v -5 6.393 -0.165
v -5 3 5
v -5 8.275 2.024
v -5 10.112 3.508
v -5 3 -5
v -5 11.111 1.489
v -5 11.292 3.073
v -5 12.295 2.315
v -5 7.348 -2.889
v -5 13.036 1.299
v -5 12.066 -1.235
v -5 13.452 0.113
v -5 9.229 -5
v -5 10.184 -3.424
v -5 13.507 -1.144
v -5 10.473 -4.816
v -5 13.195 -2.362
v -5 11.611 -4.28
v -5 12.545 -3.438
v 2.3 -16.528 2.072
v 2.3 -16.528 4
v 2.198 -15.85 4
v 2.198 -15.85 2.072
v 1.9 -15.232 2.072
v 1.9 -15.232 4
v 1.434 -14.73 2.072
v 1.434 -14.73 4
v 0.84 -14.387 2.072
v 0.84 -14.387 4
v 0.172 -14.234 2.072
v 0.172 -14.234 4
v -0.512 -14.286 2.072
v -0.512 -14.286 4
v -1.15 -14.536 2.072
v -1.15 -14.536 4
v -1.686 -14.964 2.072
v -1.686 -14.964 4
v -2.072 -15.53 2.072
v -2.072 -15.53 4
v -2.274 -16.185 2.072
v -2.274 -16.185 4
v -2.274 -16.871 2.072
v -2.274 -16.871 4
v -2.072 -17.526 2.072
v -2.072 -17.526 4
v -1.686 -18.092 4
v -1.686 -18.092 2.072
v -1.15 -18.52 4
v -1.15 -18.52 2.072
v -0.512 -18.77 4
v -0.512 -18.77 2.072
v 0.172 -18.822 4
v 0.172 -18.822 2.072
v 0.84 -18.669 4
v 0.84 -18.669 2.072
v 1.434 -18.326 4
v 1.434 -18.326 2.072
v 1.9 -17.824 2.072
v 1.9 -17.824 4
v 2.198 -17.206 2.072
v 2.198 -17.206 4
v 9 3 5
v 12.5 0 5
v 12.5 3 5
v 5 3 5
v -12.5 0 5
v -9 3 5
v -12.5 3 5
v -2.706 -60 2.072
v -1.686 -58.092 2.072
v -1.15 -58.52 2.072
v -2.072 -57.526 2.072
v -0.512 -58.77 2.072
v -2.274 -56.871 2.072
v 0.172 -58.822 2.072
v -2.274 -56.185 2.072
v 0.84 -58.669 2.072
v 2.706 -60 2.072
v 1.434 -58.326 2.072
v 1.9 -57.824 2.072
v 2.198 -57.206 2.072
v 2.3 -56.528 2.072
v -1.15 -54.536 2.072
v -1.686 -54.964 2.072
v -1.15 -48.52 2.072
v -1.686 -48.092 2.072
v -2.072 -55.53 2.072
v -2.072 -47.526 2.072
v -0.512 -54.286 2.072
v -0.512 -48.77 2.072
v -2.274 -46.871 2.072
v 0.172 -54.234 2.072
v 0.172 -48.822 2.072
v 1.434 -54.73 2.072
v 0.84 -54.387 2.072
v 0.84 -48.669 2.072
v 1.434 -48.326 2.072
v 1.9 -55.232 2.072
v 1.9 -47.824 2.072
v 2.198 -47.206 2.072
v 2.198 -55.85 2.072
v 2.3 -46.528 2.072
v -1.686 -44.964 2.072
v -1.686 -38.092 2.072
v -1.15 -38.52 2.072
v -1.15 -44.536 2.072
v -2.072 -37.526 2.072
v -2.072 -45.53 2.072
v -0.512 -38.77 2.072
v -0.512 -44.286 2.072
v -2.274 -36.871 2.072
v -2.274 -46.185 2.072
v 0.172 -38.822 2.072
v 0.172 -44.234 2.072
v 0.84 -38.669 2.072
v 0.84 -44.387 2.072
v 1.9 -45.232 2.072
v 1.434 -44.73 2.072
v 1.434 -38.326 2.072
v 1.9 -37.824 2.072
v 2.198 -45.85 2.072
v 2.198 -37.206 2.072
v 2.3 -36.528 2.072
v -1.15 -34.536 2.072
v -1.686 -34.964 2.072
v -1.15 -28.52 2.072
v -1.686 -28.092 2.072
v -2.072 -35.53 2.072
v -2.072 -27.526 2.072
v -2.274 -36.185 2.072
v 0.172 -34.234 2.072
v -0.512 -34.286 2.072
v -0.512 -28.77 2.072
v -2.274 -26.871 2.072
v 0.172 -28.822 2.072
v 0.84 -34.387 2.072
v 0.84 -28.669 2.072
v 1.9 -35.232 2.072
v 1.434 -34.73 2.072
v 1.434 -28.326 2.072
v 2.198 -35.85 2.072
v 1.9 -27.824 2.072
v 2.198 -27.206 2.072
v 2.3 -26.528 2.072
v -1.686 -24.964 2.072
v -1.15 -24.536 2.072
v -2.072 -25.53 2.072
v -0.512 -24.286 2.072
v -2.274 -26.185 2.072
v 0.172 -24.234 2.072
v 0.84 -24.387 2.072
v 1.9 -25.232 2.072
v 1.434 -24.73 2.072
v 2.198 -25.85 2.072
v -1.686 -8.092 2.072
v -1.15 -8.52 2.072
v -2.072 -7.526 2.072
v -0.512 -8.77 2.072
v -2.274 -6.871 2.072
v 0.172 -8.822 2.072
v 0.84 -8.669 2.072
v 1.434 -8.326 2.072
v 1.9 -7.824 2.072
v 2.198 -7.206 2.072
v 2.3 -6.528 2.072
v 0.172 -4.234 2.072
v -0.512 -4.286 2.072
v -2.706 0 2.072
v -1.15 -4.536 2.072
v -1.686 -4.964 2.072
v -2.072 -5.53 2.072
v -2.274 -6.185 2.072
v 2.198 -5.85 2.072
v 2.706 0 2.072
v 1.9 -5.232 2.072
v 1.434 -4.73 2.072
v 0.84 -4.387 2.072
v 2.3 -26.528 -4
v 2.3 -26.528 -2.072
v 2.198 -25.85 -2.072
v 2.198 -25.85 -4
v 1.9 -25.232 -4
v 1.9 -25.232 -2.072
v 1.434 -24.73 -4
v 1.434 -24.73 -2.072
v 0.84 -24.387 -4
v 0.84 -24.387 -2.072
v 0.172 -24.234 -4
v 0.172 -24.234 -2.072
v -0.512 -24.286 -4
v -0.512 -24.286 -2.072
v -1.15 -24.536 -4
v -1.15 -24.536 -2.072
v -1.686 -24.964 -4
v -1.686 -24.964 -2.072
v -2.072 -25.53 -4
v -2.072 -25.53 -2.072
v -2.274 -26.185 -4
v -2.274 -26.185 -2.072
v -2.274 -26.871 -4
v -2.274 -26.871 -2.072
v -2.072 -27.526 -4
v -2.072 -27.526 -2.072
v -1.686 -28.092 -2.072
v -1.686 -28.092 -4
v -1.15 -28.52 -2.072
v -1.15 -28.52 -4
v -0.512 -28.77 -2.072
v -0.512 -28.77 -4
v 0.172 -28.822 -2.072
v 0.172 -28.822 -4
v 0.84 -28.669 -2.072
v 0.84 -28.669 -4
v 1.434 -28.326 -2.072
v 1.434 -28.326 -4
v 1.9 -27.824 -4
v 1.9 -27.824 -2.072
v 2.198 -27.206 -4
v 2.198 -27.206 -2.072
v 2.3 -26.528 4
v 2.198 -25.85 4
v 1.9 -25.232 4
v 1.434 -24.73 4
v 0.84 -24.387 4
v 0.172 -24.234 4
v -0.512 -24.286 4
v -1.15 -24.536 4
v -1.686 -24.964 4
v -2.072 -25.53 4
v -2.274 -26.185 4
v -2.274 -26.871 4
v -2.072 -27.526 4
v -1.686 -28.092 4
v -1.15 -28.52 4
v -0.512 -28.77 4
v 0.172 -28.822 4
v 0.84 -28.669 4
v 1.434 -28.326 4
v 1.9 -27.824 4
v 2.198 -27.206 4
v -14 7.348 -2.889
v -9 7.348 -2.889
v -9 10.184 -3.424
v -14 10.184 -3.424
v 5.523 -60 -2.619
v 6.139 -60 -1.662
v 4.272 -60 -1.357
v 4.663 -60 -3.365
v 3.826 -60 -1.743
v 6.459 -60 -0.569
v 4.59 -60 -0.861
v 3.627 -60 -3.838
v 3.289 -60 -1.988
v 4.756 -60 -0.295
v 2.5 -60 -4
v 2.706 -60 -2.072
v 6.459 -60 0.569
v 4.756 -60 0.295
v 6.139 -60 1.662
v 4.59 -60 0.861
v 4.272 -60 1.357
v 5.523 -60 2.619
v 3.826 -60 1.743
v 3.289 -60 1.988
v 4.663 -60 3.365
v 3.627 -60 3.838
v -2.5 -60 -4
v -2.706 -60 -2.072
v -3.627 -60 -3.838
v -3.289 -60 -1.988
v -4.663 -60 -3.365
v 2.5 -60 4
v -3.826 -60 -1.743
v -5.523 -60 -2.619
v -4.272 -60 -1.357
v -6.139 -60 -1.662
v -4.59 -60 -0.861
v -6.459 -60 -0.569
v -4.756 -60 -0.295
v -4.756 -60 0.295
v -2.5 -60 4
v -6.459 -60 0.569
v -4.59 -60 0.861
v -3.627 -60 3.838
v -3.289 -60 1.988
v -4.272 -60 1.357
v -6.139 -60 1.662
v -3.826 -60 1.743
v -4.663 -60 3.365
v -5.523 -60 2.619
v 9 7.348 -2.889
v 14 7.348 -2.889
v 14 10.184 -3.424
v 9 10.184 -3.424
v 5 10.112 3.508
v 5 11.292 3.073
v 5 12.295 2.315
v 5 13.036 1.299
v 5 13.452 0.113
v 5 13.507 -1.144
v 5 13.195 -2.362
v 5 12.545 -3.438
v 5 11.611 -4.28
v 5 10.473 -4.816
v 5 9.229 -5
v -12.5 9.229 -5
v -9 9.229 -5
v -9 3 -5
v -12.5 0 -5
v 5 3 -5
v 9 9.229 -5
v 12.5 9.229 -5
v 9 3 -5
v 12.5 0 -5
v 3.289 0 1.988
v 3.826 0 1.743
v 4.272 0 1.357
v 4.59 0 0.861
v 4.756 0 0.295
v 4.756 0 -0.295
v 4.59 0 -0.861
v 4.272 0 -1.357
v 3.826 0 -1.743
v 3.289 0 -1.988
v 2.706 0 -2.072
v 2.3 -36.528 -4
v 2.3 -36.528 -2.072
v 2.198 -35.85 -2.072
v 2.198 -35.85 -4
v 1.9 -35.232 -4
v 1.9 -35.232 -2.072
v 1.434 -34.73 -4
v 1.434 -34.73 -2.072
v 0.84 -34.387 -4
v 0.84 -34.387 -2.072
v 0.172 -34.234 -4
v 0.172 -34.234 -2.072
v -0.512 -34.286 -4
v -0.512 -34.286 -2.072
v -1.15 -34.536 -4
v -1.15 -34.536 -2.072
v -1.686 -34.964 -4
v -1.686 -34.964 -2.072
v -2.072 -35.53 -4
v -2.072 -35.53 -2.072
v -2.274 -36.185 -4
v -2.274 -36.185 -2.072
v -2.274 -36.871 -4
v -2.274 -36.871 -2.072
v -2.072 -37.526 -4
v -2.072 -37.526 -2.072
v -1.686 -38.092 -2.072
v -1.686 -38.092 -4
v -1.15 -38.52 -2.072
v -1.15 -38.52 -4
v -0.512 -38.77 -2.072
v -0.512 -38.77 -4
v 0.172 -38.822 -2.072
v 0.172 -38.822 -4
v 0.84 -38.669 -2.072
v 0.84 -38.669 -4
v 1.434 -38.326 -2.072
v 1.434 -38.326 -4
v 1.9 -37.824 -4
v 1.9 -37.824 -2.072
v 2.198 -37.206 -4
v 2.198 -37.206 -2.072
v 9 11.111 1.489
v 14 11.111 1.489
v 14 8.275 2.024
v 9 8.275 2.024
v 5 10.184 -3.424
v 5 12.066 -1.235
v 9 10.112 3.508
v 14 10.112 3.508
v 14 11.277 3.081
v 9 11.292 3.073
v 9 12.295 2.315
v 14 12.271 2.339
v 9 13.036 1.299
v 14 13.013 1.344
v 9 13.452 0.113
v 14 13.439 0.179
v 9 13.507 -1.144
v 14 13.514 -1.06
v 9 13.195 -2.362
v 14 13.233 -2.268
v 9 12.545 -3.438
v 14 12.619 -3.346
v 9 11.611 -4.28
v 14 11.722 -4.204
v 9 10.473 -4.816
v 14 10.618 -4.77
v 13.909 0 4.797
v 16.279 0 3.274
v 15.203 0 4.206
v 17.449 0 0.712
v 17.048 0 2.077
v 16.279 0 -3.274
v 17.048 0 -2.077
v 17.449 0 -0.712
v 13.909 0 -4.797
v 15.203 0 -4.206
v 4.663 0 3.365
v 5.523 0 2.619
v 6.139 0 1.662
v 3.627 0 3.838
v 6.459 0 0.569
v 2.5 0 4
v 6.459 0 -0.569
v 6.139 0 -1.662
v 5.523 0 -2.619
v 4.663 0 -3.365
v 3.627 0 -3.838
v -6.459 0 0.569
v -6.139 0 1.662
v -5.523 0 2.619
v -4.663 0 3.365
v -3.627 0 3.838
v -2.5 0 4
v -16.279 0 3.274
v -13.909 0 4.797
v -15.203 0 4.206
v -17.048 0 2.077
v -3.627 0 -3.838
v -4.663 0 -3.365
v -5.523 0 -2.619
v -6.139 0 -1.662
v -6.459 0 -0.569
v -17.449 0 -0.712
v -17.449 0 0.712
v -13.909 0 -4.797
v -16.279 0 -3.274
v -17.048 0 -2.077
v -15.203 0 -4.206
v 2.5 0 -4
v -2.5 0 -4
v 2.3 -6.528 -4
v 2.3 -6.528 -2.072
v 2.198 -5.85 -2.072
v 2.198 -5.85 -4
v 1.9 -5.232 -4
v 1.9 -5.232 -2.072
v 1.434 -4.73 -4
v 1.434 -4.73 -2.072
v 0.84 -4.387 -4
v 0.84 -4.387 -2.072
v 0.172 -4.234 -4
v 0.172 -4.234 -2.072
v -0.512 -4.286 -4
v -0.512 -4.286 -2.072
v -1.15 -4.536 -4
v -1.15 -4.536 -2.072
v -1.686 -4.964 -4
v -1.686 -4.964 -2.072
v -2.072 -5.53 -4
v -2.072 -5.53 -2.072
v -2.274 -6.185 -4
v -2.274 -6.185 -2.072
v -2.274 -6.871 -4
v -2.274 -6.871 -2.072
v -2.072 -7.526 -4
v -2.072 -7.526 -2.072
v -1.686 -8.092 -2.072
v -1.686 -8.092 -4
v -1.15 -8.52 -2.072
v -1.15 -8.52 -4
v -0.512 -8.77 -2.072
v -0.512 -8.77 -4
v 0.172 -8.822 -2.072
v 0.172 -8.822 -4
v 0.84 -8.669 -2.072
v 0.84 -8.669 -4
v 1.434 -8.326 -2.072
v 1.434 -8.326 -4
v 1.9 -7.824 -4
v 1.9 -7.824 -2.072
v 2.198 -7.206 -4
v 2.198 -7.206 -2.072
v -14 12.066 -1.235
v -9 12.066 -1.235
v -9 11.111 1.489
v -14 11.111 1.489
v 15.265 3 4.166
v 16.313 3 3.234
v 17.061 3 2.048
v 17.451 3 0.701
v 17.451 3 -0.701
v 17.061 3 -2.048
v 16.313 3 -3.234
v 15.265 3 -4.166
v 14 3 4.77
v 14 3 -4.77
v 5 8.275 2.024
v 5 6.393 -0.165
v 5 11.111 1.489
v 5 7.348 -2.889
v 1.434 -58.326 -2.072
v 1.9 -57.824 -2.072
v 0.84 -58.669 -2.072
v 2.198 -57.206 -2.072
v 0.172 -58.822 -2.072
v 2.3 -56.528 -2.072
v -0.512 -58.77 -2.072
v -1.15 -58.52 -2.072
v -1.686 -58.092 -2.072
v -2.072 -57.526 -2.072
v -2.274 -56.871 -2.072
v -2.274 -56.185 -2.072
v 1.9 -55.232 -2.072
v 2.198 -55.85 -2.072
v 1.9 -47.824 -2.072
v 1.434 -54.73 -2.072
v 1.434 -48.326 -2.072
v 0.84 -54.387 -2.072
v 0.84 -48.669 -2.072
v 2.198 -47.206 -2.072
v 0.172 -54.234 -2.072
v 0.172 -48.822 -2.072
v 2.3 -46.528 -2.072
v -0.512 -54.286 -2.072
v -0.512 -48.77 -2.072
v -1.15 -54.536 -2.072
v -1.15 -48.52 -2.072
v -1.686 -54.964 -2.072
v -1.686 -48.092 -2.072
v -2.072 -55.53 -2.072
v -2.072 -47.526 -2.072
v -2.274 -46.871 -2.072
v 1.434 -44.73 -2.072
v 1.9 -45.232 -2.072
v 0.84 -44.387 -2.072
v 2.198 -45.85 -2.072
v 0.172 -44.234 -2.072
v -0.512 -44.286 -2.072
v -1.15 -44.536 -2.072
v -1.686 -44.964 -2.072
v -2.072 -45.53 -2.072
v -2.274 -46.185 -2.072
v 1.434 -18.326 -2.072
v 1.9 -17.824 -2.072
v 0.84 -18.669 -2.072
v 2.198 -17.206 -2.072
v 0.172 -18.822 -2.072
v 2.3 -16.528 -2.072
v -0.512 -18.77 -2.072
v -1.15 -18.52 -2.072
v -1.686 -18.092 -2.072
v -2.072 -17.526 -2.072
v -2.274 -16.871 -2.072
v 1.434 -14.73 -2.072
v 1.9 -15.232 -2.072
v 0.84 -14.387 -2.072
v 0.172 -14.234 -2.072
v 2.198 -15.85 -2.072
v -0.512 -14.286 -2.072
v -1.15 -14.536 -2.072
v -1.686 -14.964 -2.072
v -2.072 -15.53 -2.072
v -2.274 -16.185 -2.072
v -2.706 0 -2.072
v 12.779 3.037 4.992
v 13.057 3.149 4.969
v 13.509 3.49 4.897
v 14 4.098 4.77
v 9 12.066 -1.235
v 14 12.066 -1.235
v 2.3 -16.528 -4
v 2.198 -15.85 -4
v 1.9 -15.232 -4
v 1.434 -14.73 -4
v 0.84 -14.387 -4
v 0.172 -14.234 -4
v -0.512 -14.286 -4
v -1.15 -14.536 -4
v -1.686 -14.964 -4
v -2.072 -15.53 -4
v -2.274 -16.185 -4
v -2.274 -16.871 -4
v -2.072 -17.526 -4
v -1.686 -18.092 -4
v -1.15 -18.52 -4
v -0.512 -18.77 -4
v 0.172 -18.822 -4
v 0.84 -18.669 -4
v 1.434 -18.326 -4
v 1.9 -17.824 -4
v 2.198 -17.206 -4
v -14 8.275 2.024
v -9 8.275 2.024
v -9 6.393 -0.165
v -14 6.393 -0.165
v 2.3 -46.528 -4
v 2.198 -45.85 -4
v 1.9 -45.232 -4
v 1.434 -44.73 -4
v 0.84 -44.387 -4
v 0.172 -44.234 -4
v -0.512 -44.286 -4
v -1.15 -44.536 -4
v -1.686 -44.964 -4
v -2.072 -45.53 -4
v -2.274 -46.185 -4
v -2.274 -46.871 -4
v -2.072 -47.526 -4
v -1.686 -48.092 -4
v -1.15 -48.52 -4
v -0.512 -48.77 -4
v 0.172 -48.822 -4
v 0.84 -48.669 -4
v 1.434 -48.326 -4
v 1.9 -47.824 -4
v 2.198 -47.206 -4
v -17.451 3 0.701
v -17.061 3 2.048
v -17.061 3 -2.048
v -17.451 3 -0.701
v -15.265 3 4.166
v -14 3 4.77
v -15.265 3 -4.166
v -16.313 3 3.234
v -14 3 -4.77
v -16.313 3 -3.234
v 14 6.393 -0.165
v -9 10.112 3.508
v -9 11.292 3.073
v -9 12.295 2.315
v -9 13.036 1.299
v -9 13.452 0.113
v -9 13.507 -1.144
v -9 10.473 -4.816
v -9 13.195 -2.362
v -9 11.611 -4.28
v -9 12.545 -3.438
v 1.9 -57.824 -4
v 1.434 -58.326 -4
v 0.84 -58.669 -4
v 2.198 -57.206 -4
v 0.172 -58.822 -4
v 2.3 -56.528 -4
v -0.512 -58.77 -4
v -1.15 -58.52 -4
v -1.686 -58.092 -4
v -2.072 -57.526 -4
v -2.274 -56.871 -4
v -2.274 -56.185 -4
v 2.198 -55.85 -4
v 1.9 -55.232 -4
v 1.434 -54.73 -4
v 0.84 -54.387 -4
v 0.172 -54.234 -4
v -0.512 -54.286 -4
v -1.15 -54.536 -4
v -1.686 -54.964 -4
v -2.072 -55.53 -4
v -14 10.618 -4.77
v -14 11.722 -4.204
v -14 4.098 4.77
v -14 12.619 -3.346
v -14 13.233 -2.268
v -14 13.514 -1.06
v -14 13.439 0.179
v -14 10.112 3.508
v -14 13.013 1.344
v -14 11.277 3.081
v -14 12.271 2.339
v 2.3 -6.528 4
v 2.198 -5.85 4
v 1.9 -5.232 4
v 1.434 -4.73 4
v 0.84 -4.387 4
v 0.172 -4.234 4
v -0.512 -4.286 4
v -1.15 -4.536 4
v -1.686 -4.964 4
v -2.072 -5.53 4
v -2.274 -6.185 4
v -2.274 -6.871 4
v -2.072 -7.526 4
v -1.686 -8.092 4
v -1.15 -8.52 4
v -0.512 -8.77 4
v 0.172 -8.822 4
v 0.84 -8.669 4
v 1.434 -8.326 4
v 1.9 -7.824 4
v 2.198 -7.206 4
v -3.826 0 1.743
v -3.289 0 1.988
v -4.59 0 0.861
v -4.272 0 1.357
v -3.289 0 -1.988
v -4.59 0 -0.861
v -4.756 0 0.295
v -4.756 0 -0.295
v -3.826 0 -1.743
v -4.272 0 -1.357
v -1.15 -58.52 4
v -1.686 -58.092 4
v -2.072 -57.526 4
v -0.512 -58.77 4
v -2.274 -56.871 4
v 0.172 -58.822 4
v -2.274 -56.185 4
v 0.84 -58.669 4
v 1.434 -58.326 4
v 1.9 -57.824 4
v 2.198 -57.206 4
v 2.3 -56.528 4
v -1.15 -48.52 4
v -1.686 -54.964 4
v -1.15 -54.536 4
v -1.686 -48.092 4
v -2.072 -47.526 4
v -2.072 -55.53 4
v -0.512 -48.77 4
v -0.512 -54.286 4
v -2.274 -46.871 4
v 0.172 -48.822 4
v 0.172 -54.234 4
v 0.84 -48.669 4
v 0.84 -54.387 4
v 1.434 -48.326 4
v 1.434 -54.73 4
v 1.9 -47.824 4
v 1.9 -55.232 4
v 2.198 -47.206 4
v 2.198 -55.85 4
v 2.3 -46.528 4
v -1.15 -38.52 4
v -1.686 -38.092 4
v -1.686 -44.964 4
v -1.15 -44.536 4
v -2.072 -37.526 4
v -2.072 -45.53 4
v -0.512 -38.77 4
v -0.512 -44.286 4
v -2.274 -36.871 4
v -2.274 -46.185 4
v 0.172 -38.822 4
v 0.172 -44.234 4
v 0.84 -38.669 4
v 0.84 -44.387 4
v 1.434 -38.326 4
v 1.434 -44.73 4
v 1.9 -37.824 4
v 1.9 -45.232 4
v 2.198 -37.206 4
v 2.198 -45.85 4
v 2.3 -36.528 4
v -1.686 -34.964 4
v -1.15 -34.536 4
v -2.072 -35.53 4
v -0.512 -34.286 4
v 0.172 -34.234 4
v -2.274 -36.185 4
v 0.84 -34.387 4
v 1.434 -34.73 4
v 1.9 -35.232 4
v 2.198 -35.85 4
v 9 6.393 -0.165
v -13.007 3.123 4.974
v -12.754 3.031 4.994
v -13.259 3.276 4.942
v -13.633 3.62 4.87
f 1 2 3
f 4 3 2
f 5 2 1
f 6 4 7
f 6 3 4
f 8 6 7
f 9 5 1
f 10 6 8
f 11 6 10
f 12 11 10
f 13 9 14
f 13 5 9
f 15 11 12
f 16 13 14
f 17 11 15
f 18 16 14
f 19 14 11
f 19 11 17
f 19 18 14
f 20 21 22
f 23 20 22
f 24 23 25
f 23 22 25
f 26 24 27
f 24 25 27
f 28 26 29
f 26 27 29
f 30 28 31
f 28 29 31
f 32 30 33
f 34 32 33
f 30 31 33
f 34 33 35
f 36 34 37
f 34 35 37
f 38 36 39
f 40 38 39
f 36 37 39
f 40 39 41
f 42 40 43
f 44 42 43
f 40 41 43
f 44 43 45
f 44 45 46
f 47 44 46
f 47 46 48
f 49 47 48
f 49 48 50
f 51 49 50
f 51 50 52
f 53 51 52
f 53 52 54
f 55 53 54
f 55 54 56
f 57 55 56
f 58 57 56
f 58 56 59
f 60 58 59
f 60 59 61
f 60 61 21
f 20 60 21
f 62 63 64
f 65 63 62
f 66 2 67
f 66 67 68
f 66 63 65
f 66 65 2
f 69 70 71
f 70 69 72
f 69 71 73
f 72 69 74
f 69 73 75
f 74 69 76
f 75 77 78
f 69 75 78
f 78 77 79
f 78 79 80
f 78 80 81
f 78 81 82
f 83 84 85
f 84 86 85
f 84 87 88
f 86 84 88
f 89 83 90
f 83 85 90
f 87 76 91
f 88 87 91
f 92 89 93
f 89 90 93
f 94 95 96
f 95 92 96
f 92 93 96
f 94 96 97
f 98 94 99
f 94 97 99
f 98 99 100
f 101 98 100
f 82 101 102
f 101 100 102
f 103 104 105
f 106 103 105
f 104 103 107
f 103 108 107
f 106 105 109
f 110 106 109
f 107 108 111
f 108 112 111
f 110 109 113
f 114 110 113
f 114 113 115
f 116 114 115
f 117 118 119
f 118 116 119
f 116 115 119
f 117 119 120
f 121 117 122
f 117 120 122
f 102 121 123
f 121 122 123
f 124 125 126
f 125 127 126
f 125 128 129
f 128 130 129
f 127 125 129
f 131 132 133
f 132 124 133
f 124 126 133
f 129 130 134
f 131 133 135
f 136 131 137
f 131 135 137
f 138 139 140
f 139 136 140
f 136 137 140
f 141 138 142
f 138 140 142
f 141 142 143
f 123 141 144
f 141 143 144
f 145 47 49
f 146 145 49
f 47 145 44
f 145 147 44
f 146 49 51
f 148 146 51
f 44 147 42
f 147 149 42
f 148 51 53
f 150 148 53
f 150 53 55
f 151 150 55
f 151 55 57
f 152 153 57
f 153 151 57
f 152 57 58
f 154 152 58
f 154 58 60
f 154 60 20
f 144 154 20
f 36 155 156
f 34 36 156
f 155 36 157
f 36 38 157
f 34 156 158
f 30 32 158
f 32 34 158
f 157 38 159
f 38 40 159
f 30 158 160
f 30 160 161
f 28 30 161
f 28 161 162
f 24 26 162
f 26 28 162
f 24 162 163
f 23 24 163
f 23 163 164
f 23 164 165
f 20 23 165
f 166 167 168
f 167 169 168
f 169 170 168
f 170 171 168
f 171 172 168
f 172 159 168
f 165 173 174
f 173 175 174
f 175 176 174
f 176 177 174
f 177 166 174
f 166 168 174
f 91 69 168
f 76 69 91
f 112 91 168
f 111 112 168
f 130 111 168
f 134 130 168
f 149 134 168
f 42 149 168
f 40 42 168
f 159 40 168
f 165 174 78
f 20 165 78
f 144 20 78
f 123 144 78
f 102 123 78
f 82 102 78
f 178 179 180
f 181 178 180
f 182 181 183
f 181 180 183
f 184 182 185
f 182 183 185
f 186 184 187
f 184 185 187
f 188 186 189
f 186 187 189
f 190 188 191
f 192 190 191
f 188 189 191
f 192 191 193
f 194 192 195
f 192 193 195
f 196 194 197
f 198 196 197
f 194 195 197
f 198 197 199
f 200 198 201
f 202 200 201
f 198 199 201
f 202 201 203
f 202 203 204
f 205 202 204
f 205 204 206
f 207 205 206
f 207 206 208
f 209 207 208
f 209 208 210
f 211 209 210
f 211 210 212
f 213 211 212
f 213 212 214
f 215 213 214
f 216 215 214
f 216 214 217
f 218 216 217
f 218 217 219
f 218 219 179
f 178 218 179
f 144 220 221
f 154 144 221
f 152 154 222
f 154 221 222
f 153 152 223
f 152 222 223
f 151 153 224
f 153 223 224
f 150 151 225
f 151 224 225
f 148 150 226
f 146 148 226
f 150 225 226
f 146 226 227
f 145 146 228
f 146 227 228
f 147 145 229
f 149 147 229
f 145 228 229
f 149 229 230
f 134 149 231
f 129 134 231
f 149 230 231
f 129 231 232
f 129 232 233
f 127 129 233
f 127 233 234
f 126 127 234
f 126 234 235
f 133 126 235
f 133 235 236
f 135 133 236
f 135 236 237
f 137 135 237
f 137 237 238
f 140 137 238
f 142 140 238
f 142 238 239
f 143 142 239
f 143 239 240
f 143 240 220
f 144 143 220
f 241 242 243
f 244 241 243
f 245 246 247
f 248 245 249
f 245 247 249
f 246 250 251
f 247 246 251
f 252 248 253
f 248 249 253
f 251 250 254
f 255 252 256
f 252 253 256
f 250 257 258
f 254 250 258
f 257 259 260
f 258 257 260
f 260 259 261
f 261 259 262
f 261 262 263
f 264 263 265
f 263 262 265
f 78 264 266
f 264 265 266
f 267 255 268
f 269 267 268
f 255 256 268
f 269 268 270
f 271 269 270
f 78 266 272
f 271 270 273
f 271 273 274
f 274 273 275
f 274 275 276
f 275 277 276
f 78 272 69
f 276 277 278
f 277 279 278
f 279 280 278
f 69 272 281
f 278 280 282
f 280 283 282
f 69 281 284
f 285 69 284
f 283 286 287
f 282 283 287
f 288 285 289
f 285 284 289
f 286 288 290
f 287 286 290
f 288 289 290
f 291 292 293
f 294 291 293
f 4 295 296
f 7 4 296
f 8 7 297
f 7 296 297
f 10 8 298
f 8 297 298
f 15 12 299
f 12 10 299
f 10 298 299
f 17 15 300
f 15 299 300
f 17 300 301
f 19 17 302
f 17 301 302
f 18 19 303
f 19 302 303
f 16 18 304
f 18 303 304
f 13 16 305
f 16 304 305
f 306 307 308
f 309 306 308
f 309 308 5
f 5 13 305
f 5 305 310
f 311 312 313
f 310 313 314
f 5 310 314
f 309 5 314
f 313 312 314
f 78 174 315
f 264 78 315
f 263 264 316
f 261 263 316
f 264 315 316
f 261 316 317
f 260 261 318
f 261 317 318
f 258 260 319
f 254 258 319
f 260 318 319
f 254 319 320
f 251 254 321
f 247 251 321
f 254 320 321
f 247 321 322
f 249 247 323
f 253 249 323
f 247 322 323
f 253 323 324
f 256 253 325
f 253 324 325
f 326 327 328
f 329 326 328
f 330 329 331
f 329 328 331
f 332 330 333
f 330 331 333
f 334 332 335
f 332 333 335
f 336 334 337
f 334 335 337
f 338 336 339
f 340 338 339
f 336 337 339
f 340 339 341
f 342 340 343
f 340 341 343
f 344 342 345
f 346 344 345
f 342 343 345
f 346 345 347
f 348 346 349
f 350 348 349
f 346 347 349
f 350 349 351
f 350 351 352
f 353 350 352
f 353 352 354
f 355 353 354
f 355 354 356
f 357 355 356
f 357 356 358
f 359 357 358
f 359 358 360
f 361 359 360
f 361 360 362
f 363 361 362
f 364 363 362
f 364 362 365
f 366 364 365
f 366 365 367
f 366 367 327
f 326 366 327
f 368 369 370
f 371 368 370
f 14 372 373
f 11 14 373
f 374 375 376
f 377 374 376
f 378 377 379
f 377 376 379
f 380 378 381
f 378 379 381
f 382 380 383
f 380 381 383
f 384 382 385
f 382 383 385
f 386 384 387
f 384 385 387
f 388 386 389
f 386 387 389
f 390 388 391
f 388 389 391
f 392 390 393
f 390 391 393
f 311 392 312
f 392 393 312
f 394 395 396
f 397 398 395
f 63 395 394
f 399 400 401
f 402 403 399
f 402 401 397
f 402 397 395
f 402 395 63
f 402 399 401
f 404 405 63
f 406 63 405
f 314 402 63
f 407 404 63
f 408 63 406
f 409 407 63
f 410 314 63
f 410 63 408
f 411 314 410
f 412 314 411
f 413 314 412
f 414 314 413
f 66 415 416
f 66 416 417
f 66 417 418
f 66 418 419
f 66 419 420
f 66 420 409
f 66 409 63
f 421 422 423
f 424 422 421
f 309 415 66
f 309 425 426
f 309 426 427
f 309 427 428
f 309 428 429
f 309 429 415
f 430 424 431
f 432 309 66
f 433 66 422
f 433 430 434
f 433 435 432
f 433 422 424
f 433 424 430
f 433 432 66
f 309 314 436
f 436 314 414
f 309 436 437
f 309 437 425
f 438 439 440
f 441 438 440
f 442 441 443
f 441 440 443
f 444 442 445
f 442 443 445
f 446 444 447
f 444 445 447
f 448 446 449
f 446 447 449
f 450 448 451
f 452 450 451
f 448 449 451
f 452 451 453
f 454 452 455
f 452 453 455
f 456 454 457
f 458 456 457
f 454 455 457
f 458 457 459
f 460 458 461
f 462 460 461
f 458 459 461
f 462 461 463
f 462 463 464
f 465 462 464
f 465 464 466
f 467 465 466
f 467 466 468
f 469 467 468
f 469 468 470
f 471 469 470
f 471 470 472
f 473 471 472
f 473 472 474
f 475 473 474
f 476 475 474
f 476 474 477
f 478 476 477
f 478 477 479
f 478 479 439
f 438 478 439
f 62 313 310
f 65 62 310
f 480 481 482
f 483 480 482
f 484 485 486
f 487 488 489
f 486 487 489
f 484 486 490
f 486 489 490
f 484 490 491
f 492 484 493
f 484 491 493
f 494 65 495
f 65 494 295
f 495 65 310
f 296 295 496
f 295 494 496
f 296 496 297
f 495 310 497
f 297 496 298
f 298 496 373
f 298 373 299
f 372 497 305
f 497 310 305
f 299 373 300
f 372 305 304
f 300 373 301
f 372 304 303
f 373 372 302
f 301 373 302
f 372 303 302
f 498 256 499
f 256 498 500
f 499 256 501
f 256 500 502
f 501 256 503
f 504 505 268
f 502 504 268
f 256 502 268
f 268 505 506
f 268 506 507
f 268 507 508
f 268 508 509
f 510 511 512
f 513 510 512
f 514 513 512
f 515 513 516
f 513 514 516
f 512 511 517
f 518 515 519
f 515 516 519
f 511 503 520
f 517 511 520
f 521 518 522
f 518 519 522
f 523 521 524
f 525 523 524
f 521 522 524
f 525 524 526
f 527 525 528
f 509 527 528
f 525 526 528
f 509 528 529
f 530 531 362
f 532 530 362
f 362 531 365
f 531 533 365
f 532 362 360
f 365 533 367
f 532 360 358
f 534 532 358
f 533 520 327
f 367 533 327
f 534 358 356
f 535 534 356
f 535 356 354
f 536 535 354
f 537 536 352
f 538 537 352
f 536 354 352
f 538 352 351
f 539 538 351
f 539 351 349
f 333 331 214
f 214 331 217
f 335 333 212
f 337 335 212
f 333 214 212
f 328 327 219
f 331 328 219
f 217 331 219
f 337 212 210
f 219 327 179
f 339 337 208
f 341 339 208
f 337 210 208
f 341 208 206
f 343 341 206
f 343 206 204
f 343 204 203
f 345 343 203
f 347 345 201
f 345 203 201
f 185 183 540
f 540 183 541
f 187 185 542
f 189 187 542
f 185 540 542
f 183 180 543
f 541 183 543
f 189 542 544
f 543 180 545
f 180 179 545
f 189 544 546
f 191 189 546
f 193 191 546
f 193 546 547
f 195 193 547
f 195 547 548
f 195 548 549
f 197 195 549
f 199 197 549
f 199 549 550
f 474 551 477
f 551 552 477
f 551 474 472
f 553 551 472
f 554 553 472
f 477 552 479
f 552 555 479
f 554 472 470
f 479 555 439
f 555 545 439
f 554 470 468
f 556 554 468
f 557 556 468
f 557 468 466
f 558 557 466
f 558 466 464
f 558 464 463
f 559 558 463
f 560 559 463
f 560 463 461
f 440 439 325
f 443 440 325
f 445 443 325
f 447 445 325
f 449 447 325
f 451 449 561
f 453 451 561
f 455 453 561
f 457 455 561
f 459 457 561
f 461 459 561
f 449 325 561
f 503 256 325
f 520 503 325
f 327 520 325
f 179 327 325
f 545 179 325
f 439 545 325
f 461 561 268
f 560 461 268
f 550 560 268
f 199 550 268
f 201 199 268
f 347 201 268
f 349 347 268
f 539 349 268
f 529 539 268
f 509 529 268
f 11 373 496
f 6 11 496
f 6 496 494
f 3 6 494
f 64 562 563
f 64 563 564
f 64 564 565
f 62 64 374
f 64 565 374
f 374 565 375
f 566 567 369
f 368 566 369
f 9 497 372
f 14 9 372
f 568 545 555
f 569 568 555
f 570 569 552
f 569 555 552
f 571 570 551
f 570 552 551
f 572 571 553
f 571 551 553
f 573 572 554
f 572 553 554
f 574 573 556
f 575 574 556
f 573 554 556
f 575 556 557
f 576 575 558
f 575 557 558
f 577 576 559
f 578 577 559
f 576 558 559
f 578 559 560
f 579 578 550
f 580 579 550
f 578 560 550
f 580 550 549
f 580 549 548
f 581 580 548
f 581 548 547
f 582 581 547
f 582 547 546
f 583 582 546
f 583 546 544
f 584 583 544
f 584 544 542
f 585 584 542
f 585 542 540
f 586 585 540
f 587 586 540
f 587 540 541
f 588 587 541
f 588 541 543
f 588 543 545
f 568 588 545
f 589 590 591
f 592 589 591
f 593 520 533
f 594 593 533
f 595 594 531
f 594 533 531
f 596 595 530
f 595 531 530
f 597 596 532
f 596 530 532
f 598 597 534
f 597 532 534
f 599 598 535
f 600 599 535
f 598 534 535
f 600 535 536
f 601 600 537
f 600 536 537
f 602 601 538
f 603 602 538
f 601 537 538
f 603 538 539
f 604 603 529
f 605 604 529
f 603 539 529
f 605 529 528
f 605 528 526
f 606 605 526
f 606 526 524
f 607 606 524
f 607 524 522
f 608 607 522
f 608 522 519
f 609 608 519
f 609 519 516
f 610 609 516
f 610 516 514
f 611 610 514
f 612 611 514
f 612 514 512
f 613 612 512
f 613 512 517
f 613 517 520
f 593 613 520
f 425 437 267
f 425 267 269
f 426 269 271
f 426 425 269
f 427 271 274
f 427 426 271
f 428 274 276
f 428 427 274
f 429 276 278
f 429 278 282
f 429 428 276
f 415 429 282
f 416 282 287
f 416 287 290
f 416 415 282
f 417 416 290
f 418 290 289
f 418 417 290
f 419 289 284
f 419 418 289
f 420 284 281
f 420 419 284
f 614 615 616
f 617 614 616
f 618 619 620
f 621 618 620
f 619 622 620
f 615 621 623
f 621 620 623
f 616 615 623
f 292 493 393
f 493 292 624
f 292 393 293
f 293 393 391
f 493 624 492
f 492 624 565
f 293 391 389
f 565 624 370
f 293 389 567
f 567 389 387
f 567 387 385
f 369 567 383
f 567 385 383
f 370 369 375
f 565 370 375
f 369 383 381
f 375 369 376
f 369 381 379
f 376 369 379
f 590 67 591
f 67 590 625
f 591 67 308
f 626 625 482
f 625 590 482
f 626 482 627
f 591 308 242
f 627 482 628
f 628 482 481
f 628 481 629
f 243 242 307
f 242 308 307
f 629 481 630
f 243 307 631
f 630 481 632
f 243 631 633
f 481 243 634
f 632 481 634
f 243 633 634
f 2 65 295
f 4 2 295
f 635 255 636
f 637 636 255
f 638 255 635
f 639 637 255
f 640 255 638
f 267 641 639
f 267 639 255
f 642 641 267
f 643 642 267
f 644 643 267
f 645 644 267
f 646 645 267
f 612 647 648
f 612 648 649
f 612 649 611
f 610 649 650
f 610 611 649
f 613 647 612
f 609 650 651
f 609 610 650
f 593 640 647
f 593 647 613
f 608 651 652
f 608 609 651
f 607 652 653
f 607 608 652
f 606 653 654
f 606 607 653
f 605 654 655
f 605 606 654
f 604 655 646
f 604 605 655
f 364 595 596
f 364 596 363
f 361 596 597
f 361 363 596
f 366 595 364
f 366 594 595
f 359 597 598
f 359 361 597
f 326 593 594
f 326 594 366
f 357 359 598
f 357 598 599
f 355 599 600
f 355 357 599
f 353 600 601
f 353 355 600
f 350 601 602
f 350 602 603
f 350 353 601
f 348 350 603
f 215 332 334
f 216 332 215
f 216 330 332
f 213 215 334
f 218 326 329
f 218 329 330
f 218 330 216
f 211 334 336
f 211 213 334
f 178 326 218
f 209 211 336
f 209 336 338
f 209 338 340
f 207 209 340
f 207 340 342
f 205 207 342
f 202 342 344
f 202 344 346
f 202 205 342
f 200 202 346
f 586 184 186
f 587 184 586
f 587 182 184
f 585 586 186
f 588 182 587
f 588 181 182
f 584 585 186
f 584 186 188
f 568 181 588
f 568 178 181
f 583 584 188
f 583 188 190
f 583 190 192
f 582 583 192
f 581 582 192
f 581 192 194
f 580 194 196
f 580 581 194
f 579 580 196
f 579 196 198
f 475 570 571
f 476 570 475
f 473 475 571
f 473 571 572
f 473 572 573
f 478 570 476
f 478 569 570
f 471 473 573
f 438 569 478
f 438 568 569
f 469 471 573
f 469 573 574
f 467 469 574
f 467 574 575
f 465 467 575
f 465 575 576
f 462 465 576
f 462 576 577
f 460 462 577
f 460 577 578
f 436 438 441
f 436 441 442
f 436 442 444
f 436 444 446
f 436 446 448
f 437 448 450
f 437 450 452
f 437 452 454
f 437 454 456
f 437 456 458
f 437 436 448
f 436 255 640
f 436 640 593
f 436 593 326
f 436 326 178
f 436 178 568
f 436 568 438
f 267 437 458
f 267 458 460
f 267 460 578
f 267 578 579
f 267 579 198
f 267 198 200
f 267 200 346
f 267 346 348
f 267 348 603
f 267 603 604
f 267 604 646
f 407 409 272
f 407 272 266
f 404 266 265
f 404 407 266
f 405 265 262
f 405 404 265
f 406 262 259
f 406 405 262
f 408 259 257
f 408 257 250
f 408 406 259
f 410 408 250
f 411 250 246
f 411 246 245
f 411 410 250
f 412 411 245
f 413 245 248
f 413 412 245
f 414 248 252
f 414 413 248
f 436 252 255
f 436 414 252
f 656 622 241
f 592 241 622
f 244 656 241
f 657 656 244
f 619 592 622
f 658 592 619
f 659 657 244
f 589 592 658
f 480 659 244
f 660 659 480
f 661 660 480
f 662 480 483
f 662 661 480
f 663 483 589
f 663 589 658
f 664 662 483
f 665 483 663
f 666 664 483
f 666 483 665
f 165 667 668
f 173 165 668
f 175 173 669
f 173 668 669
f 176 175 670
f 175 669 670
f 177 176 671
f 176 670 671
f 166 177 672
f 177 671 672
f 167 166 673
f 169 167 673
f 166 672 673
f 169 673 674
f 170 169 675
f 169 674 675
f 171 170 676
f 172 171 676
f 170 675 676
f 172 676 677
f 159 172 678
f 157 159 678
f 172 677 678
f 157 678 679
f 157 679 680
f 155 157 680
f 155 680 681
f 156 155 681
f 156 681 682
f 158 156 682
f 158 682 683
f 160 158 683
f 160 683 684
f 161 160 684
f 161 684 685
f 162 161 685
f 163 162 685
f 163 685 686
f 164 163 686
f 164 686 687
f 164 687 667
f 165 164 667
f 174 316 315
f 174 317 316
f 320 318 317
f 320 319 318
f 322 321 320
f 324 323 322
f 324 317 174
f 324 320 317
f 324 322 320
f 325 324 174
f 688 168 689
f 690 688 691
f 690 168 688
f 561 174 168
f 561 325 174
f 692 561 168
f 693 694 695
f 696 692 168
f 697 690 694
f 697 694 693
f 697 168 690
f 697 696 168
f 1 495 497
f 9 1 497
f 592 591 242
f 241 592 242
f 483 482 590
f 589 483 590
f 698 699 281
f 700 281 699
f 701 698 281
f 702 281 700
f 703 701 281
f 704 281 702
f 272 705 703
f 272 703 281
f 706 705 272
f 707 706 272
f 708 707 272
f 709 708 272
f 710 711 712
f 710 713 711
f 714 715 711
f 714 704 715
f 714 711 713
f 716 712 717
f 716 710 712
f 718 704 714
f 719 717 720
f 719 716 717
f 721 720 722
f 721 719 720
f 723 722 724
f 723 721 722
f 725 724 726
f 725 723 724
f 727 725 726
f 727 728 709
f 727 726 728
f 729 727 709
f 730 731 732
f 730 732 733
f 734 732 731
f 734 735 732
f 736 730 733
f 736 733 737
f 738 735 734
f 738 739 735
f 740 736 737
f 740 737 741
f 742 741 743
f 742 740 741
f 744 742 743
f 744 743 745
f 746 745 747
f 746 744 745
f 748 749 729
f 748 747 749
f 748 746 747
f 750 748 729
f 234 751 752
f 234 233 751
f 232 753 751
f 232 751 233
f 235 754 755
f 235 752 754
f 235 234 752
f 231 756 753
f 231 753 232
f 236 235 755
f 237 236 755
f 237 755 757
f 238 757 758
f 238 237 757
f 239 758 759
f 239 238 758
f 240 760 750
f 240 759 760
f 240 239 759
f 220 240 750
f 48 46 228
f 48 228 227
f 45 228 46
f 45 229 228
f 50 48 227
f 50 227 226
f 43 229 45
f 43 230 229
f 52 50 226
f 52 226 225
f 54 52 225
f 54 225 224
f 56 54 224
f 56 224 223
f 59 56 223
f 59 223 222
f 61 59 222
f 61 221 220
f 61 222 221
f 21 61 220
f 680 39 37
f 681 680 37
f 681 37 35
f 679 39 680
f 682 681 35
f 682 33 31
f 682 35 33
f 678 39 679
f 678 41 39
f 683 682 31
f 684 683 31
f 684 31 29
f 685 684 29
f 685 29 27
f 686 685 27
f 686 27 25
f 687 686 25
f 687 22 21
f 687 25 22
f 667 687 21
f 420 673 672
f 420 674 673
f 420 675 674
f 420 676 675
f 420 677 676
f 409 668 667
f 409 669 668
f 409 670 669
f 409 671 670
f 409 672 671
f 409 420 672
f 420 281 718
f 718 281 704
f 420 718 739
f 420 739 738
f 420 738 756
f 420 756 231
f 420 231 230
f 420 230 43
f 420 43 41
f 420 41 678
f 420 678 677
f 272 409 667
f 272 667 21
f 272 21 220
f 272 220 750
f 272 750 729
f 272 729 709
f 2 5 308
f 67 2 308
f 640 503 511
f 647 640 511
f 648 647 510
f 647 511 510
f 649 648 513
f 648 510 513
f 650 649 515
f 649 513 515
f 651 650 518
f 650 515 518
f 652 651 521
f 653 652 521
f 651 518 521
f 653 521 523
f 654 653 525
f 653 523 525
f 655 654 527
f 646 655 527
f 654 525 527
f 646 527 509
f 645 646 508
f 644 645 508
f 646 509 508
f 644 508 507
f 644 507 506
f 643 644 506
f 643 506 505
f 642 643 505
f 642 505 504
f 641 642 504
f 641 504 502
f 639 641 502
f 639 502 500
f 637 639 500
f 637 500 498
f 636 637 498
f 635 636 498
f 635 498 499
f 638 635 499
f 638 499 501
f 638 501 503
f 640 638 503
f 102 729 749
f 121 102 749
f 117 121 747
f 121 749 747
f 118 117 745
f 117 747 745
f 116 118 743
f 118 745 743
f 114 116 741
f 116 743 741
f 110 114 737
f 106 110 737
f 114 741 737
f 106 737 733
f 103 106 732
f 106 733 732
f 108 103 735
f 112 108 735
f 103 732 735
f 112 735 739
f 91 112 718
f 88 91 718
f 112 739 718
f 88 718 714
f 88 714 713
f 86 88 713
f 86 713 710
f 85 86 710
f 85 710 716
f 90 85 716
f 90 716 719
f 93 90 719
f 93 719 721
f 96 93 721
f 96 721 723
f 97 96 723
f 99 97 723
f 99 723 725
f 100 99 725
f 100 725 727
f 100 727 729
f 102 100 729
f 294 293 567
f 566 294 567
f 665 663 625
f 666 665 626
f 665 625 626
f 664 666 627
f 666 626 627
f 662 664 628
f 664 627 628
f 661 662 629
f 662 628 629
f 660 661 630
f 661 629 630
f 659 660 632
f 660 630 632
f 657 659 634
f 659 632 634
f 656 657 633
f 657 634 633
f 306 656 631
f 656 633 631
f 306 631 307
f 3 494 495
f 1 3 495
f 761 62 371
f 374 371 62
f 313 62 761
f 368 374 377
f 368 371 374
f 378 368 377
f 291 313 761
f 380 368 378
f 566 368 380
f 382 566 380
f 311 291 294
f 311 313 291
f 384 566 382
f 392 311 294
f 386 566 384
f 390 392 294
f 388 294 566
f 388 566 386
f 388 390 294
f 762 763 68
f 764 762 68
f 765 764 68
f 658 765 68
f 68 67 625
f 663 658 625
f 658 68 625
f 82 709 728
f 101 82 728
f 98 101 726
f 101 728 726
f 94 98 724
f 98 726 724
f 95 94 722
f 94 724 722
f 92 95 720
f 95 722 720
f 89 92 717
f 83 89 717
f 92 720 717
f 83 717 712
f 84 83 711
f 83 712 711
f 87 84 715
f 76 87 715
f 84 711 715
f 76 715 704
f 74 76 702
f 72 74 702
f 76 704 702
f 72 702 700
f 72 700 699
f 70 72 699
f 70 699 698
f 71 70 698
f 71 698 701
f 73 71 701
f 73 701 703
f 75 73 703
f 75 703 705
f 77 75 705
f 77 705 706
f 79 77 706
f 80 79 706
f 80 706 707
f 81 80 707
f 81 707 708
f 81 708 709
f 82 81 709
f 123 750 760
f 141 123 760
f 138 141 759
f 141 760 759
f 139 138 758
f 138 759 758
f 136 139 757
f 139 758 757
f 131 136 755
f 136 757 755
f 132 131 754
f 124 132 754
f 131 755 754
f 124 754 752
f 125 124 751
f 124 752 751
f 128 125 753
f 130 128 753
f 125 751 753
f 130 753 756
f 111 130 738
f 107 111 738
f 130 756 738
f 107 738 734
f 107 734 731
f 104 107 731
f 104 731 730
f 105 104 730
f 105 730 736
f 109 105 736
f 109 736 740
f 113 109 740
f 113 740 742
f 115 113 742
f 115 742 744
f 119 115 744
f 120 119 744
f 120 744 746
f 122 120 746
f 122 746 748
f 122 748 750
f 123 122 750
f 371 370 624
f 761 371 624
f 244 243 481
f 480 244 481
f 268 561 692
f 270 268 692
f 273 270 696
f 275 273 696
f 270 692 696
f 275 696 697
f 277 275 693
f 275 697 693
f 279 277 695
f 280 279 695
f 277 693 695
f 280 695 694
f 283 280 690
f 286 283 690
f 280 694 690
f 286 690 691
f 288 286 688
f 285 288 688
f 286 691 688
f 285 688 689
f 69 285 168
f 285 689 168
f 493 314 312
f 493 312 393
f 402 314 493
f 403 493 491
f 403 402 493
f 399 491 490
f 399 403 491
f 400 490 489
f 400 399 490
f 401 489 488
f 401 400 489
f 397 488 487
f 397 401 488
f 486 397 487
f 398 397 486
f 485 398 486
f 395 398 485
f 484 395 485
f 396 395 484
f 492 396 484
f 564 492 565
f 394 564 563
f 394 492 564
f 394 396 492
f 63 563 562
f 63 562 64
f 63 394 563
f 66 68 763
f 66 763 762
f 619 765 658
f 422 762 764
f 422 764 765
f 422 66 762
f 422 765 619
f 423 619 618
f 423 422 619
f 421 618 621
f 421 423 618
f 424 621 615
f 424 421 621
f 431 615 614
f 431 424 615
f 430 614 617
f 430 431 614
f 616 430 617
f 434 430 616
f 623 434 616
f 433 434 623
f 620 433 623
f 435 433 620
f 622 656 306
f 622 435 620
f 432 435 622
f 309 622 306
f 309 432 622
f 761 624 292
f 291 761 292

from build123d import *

# Parameters (mm, degrees)
EXTRUDE_1_DEPTH     = 3
EXTRUDE_2_DEPTH     = 14
EXTRUDE_3_DEPTH     = 60
SKETCH_4_R          = 2.3
CUT_EXTRUDE_1_DEPTH = 60
SKETCH_6_W          = 4
SKETCH_6_H          = 10.529479437
CUT_EXTRUDE_2_DEPTH = 60
CUT_EXTRUDE_4_DEPTH = 60


with BuildPart() as part:
    # 草图1 → 凸台-拉伸1 (new body)
    with BuildSketch(Plane(origin=(0, 0, 0), x_dir=(1, 0, 0), z_dir=(0, 1, 0))):
        with BuildLine():
            Line((-12.5, 5), (12.5, 5))
            ThreePointArc((12.5, 5), (17.5, 0), (12.5, -5))
            Line((12.5, -5), (-12.5, -5))
            ThreePointArc((-12.5, -5), (-17.5, 0), (-12.5, 5))
        make_face()
    extrude(amount=EXTRUDE_1_DEPTH)

    # 草图2 → 凸台-拉伸2 (add, symmetric)
    with BuildSketch(Plane(origin=(0, 0, 0), x_dir=(0, 0, -1), z_dir=(1, 0, 0))):
        with BuildLine():
            Line((-5, 3), (-3.508412685, 10.112107418))
            ThreePointArc((-3.508412685, 10.112107418), (1.143689593, 13.506528918), (5, 9.229494551))
            Line((5, 9.229494551), (5, 3))
            Line((5, 3), (-5, 3))
        make_face()
        Polygon((2.88904253, 7.347609244), (3.424289305, 10.184305249), (1.235261889, 12.066190555), (-1.489012301, 11.111379858), (-2.024259076, 8.274683853), (0.164768339, 6.392798546), align=None, mode=Mode.SUBTRACT)
    extrude(amount=EXTRUDE_2_DEPTH, both=True)

    # 草图3 → 凸台-拉伸3 (add)
    with BuildSketch(Plane.XZ):
        with BuildLine():
            Line((-2.5, 4), (2.5, 4))
            ThreePointArc((2.5, 4), (6.5, 0), (2.5, -4))
            Line((2.5, -4), (-2.5, -4))
            ThreePointArc((-2.5, -4), (-6.5, 0), (-2.5, 4))
        make_face()
        with BuildLine():
            Line((-2.705614888, 2.07197125), (2.705614888, 2.07197125))
            ThreePointArc((2.705614888, 2.07197125), (4.777586138, 0), (2.705614888, -2.07197125))
            Line((2.705614888, -2.07197125), (-2.705614888, -2.07197125))
            ThreePointArc((-2.705614888, -2.07197125), (-4.777586138, 0), (-2.705614888, 2.07197125))
        make_face(mode=Mode.SUBTRACT)
    extrude(amount=EXTRUDE_3_DEPTH)

    # 草图4 → 切除-拉伸1 (cut)
    with BuildSketch(Plane.XY.offset(4)):
        with Locations((0, -6.528023855)):
            Circle(SKETCH_4_R)
        with Locations((0, -16.528023855)):
            Circle(SKETCH_4_R)
        with Locations((0, -26.528023855)):
            Circle(SKETCH_4_R)
        with Locations((0, -36.528023855)):
            Circle(SKETCH_4_R)
        with Locations((0, -46.528023855)):
            Circle(SKETCH_4_R)
        with Locations((0, -56.528023855)):
            Circle(SKETCH_4_R)
    extrude(amount=-CUT_EXTRUDE_1_DEPTH, mode=Mode.SUBTRACT)

    # 草图6 → 切除-拉伸2 (cut)
    with BuildSketch(Plane(origin=(0, 0, -5), x_dir=(-1, 0, 0), z_dir=(0, 0, -1))):
        with Locations((-7, 8.264739718)):
            Rectangle(SKETCH_6_W, SKETCH_6_H)
        with Locations((7, 8.264739718)):
            Rectangle(SKETCH_6_W, SKETCH_6_H)
    extrude(amount=-CUT_EXTRUDE_2_DEPTH, mode=Mode.SUBTRACT)

    # 草图7 → 切除-拉伸4 (cut)
    with BuildSketch(Plane.XZ):
        with BuildLine():
            Line((-21.020097189, 8.097906294), (21.020097189, 8.097906294))
            ThreePointArc((21.020097189, 8.097906294), (29.118003483, 0), (21.020097189, -8.097906294))
            Line((21.020097189, -8.097906294), (-21.020097189, -8.097906294))
            ThreePointArc((-21.020097189, -8.097906294), (-29.118003483, 0), (-21.020097189, 8.097906294))
        make_face()
        with BuildLine():
            Line((-12.5, -5), (12.5, -5))
            ThreePointArc((12.5, -5), (17.5, 0), (12.5, 5))
            Line((12.5, 5), (-12.5, 5))
            ThreePointArc((-12.5, 5), (-17.5, 0), (-12.5, -5))
        make_face(mode=Mode.SUBTRACT)
    extrude(amount=-CUT_EXTRUDE_4_DEPTH, mode=Mode.SUBTRACT)


solid = part.part
